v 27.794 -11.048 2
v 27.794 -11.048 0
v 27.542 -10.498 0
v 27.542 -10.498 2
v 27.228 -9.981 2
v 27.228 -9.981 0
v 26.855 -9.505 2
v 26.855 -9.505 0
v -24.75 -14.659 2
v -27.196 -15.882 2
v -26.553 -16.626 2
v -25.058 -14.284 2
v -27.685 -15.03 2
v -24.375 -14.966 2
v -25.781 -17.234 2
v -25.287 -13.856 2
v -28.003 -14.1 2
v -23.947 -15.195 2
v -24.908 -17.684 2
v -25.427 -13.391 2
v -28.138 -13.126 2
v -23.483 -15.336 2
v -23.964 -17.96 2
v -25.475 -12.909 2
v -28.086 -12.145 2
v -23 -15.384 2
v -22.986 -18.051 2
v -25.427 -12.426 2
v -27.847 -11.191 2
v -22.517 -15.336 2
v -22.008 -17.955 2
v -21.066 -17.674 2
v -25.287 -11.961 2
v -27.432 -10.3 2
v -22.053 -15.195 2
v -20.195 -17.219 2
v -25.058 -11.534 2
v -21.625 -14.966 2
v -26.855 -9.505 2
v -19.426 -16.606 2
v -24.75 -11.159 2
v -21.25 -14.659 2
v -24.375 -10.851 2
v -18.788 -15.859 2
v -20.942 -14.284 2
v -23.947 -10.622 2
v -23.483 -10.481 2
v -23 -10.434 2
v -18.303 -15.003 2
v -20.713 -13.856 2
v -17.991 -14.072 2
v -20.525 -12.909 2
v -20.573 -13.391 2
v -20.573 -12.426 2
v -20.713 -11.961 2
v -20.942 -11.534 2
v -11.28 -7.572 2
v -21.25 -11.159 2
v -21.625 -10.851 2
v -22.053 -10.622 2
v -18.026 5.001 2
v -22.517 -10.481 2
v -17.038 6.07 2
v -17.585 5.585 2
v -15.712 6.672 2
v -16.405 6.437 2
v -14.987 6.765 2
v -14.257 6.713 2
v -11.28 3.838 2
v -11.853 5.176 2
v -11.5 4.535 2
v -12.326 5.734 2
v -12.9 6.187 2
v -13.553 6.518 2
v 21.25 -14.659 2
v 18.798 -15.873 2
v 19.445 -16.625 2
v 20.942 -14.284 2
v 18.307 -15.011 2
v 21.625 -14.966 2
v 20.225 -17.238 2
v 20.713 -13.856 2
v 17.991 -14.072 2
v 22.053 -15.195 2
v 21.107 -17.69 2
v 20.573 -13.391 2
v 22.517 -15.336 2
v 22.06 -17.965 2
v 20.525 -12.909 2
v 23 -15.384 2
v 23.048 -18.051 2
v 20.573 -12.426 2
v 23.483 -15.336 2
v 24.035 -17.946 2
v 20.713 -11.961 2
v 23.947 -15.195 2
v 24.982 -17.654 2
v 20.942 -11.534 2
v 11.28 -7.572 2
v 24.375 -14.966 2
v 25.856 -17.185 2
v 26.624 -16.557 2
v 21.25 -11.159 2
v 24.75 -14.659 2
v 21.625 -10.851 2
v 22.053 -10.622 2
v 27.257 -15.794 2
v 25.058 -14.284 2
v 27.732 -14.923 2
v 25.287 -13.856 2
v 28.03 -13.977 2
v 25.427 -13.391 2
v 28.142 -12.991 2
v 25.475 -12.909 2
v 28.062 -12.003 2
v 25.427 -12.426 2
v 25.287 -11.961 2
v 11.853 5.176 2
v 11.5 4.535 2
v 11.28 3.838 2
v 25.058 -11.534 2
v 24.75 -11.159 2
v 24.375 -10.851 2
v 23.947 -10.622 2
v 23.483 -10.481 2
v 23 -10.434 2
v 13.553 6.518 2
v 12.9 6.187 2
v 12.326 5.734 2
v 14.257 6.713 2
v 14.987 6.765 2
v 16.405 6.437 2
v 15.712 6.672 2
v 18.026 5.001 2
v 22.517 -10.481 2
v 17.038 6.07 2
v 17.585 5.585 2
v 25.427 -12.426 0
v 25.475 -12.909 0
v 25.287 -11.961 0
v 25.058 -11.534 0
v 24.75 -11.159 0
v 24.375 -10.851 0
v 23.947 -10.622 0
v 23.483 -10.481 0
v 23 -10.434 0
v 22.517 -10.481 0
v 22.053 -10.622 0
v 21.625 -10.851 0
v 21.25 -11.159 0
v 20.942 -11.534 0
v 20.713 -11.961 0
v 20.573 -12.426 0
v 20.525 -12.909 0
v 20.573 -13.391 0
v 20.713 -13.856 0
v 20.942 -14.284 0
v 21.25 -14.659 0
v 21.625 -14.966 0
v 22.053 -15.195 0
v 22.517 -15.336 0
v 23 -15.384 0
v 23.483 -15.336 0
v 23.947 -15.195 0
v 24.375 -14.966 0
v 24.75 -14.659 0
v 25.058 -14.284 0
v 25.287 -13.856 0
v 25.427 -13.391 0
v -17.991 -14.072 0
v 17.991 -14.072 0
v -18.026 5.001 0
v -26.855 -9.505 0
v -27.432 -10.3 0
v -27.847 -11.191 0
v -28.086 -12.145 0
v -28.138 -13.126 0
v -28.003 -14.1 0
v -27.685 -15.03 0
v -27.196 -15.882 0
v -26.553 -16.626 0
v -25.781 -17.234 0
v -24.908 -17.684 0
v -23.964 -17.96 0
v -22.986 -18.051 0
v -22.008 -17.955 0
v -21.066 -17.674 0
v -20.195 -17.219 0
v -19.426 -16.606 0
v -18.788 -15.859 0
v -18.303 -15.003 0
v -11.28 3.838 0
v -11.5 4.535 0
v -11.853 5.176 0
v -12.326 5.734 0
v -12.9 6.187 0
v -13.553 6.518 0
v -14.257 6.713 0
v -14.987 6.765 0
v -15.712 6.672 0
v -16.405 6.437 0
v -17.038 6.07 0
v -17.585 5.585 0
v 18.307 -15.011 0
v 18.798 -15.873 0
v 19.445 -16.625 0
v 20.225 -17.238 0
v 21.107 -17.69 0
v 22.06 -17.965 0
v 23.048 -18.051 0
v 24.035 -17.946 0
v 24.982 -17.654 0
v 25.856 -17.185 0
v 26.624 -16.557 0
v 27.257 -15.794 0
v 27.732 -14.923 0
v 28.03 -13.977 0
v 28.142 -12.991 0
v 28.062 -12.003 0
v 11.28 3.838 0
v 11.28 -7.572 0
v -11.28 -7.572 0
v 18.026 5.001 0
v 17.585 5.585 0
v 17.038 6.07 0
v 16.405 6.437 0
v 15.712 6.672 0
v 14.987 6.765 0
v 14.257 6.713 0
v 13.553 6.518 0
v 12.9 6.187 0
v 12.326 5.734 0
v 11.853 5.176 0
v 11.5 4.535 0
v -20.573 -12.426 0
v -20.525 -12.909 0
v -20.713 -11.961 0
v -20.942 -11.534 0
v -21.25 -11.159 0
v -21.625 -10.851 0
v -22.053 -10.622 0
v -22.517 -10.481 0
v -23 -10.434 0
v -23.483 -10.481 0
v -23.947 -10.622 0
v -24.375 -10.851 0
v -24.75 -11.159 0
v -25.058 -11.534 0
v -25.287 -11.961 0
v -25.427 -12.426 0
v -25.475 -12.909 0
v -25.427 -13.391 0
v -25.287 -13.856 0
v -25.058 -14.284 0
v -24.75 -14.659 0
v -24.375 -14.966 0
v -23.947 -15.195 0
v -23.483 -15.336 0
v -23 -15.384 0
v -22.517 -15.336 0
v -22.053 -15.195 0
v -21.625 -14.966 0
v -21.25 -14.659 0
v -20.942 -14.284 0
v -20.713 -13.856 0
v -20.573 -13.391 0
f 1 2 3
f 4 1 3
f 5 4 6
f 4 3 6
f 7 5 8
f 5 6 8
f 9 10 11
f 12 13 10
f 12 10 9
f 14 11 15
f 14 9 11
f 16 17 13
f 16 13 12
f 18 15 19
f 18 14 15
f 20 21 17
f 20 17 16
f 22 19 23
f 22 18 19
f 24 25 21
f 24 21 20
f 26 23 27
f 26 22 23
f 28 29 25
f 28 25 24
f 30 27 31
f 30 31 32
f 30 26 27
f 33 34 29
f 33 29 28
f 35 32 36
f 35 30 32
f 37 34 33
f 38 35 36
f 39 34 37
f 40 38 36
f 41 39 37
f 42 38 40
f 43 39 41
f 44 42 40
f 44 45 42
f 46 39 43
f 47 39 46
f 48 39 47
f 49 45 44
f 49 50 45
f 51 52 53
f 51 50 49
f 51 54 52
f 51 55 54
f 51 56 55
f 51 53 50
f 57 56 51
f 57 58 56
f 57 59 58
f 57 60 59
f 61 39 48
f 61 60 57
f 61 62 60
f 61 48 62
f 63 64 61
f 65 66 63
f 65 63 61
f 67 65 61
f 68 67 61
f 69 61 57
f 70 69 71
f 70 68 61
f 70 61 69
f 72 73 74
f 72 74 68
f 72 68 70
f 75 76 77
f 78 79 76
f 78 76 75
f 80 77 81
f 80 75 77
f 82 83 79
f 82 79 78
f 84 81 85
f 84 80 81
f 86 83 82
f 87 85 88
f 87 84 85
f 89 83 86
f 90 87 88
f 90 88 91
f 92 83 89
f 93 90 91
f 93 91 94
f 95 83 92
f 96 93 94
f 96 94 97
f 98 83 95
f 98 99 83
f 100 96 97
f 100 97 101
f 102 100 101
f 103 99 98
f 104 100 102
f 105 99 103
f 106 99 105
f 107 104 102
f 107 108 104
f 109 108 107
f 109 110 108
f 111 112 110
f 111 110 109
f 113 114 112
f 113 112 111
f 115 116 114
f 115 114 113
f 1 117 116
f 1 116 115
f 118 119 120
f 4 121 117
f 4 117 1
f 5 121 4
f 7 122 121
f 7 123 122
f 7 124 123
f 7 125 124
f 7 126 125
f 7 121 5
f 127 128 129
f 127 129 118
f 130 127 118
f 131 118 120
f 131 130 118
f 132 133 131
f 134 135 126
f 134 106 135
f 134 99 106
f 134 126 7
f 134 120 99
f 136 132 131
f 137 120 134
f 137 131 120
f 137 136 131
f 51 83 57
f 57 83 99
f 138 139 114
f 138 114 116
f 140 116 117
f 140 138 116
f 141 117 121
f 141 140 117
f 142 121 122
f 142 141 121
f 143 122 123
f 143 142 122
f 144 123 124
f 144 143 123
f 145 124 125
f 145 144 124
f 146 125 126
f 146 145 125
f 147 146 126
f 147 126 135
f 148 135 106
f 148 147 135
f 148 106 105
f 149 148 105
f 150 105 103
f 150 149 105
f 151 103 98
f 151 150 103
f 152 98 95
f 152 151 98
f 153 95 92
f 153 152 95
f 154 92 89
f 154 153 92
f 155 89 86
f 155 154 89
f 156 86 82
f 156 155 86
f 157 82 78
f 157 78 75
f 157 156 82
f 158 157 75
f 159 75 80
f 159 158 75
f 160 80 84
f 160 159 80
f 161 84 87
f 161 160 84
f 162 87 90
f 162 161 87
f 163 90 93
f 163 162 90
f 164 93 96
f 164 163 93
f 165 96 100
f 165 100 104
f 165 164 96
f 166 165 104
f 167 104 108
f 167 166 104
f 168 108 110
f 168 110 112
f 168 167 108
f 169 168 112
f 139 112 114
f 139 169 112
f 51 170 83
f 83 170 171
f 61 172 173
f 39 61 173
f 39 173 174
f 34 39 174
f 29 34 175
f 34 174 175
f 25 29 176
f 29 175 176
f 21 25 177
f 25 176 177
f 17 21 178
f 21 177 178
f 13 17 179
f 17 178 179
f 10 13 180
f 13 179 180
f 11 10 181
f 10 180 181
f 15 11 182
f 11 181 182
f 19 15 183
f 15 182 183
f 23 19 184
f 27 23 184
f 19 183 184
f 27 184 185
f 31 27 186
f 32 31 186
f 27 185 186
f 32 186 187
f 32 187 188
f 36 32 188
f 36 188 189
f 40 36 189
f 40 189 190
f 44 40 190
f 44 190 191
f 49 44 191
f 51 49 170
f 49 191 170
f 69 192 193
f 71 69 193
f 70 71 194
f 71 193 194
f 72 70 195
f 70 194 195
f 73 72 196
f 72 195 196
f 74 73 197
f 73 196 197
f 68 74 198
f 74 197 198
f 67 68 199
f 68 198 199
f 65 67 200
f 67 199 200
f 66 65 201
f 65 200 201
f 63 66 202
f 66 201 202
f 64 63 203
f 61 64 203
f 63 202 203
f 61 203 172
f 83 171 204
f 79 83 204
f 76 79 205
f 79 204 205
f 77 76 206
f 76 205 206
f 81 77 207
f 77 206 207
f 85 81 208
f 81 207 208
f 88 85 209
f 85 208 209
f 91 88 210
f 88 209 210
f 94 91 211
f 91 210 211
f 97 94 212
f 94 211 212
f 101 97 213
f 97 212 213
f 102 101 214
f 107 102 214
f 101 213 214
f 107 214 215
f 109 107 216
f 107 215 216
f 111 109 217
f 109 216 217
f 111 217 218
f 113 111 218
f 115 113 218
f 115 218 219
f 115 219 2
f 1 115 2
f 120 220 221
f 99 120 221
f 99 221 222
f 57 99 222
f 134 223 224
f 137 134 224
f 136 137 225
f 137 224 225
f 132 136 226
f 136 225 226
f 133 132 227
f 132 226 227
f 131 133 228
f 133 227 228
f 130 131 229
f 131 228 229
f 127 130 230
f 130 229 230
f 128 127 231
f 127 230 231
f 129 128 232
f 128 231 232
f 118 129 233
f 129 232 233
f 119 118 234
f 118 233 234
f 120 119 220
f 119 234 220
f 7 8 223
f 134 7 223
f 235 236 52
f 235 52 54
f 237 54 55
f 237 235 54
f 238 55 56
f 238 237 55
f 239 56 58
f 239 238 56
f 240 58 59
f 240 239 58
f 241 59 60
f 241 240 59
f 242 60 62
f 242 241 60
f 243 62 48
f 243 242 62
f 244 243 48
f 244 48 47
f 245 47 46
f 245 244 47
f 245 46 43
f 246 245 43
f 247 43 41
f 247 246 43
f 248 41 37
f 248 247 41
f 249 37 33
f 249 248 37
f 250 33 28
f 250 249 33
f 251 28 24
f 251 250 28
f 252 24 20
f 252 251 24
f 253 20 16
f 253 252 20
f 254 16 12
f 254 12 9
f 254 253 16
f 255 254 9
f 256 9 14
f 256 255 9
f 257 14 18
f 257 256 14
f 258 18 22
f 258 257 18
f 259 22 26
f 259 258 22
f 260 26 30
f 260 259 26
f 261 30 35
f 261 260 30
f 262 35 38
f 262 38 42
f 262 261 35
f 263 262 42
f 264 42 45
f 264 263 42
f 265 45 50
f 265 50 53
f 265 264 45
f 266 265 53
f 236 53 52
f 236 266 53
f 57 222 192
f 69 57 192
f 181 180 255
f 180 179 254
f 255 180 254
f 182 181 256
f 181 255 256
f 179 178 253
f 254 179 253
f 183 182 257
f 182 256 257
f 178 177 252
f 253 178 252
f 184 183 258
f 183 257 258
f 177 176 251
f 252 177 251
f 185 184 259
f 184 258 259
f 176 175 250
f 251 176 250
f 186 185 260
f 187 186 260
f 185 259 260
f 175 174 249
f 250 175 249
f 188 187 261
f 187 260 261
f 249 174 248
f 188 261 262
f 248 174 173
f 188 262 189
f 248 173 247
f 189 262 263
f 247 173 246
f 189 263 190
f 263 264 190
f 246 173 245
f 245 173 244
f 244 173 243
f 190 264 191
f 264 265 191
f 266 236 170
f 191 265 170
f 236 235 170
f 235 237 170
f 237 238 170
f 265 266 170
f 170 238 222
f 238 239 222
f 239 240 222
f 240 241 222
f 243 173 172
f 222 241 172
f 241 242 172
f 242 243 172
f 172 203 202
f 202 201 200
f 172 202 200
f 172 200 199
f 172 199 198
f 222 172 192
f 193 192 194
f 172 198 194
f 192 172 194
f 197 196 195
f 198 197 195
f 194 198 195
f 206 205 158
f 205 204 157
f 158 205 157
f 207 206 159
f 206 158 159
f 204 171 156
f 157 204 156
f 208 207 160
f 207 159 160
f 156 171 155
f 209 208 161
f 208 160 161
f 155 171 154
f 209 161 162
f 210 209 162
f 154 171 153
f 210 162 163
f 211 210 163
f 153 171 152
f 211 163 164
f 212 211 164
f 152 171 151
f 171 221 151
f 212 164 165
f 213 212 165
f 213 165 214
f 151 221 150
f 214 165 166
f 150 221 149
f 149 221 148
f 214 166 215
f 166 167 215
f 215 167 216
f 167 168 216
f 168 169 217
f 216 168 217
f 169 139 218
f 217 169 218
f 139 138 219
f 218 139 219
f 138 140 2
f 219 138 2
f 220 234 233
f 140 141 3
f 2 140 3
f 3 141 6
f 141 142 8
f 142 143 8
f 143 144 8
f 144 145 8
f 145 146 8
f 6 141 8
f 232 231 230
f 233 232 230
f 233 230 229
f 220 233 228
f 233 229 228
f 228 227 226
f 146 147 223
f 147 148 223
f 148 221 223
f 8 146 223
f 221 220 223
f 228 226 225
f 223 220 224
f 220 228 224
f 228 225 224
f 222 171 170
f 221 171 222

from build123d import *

# Parameters (mm, degrees)
F0_R     = 2.475
F1_DEPTH = 2


with BuildPart() as f1:
    # F0 (on Top) → F1 (new body)
    with BuildSketch(Plane.XY):
        with BuildLine():
            ThreePointArc((-11.28048, 3.837689), (-14.25743, 6.713427), (-18.025508, 5.000625))
            Line((-18.025508, 5.000625), (-26.854825, -9.504681))
            ThreePointArc((-26.854825, -9.504681), (-25.355263, -17.480133), (-17.990624, -14.071526))
            Line((-17.990624, -14.071526), (0, -14.071526))
            Line((0, -14.071526), (17.990624, -14.071526))
            ThreePointArc((17.990624, -14.071526), (24.515641, -17.822764), (27.794171, -11.047893))
            Line((27.794171, -11.047893), (26.854825, -9.504681))
            Line((26.854825, -9.504681), (18.025508, 5.000625))
            ThreePointArc((18.025508, 5.000625), (14.25743, 6.713427), (11.28048, 3.837689))
            Line((11.28048, 3.837689), (11.28048, -7.571526))
            Line((11.28048, -7.571526), (0, -7.571526))
            Line((0, -7.571526), (-11.28048, -7.571526))
            Line((-11.28048, -7.571526), (-11.28048, 3.837689))
        make_face()
        with Locations((-23, -12.90859)):
            Circle(F0_R, mode=Mode.SUBTRACT)
        with Locations((23, -12.90859)):
            Circle(F0_R, mode=Mode.SUBTRACT)
        with BuildLine():
            Line((26.854825, -9.504681), (27.794171, -11.047893))
            ThreePointArc((27.794171, -11.047893), (27.392796, -10.234714), (26.854825, -9.504681))
        make_face()
    extrude(amount=F1_DEPTH)


solid = f1.part
